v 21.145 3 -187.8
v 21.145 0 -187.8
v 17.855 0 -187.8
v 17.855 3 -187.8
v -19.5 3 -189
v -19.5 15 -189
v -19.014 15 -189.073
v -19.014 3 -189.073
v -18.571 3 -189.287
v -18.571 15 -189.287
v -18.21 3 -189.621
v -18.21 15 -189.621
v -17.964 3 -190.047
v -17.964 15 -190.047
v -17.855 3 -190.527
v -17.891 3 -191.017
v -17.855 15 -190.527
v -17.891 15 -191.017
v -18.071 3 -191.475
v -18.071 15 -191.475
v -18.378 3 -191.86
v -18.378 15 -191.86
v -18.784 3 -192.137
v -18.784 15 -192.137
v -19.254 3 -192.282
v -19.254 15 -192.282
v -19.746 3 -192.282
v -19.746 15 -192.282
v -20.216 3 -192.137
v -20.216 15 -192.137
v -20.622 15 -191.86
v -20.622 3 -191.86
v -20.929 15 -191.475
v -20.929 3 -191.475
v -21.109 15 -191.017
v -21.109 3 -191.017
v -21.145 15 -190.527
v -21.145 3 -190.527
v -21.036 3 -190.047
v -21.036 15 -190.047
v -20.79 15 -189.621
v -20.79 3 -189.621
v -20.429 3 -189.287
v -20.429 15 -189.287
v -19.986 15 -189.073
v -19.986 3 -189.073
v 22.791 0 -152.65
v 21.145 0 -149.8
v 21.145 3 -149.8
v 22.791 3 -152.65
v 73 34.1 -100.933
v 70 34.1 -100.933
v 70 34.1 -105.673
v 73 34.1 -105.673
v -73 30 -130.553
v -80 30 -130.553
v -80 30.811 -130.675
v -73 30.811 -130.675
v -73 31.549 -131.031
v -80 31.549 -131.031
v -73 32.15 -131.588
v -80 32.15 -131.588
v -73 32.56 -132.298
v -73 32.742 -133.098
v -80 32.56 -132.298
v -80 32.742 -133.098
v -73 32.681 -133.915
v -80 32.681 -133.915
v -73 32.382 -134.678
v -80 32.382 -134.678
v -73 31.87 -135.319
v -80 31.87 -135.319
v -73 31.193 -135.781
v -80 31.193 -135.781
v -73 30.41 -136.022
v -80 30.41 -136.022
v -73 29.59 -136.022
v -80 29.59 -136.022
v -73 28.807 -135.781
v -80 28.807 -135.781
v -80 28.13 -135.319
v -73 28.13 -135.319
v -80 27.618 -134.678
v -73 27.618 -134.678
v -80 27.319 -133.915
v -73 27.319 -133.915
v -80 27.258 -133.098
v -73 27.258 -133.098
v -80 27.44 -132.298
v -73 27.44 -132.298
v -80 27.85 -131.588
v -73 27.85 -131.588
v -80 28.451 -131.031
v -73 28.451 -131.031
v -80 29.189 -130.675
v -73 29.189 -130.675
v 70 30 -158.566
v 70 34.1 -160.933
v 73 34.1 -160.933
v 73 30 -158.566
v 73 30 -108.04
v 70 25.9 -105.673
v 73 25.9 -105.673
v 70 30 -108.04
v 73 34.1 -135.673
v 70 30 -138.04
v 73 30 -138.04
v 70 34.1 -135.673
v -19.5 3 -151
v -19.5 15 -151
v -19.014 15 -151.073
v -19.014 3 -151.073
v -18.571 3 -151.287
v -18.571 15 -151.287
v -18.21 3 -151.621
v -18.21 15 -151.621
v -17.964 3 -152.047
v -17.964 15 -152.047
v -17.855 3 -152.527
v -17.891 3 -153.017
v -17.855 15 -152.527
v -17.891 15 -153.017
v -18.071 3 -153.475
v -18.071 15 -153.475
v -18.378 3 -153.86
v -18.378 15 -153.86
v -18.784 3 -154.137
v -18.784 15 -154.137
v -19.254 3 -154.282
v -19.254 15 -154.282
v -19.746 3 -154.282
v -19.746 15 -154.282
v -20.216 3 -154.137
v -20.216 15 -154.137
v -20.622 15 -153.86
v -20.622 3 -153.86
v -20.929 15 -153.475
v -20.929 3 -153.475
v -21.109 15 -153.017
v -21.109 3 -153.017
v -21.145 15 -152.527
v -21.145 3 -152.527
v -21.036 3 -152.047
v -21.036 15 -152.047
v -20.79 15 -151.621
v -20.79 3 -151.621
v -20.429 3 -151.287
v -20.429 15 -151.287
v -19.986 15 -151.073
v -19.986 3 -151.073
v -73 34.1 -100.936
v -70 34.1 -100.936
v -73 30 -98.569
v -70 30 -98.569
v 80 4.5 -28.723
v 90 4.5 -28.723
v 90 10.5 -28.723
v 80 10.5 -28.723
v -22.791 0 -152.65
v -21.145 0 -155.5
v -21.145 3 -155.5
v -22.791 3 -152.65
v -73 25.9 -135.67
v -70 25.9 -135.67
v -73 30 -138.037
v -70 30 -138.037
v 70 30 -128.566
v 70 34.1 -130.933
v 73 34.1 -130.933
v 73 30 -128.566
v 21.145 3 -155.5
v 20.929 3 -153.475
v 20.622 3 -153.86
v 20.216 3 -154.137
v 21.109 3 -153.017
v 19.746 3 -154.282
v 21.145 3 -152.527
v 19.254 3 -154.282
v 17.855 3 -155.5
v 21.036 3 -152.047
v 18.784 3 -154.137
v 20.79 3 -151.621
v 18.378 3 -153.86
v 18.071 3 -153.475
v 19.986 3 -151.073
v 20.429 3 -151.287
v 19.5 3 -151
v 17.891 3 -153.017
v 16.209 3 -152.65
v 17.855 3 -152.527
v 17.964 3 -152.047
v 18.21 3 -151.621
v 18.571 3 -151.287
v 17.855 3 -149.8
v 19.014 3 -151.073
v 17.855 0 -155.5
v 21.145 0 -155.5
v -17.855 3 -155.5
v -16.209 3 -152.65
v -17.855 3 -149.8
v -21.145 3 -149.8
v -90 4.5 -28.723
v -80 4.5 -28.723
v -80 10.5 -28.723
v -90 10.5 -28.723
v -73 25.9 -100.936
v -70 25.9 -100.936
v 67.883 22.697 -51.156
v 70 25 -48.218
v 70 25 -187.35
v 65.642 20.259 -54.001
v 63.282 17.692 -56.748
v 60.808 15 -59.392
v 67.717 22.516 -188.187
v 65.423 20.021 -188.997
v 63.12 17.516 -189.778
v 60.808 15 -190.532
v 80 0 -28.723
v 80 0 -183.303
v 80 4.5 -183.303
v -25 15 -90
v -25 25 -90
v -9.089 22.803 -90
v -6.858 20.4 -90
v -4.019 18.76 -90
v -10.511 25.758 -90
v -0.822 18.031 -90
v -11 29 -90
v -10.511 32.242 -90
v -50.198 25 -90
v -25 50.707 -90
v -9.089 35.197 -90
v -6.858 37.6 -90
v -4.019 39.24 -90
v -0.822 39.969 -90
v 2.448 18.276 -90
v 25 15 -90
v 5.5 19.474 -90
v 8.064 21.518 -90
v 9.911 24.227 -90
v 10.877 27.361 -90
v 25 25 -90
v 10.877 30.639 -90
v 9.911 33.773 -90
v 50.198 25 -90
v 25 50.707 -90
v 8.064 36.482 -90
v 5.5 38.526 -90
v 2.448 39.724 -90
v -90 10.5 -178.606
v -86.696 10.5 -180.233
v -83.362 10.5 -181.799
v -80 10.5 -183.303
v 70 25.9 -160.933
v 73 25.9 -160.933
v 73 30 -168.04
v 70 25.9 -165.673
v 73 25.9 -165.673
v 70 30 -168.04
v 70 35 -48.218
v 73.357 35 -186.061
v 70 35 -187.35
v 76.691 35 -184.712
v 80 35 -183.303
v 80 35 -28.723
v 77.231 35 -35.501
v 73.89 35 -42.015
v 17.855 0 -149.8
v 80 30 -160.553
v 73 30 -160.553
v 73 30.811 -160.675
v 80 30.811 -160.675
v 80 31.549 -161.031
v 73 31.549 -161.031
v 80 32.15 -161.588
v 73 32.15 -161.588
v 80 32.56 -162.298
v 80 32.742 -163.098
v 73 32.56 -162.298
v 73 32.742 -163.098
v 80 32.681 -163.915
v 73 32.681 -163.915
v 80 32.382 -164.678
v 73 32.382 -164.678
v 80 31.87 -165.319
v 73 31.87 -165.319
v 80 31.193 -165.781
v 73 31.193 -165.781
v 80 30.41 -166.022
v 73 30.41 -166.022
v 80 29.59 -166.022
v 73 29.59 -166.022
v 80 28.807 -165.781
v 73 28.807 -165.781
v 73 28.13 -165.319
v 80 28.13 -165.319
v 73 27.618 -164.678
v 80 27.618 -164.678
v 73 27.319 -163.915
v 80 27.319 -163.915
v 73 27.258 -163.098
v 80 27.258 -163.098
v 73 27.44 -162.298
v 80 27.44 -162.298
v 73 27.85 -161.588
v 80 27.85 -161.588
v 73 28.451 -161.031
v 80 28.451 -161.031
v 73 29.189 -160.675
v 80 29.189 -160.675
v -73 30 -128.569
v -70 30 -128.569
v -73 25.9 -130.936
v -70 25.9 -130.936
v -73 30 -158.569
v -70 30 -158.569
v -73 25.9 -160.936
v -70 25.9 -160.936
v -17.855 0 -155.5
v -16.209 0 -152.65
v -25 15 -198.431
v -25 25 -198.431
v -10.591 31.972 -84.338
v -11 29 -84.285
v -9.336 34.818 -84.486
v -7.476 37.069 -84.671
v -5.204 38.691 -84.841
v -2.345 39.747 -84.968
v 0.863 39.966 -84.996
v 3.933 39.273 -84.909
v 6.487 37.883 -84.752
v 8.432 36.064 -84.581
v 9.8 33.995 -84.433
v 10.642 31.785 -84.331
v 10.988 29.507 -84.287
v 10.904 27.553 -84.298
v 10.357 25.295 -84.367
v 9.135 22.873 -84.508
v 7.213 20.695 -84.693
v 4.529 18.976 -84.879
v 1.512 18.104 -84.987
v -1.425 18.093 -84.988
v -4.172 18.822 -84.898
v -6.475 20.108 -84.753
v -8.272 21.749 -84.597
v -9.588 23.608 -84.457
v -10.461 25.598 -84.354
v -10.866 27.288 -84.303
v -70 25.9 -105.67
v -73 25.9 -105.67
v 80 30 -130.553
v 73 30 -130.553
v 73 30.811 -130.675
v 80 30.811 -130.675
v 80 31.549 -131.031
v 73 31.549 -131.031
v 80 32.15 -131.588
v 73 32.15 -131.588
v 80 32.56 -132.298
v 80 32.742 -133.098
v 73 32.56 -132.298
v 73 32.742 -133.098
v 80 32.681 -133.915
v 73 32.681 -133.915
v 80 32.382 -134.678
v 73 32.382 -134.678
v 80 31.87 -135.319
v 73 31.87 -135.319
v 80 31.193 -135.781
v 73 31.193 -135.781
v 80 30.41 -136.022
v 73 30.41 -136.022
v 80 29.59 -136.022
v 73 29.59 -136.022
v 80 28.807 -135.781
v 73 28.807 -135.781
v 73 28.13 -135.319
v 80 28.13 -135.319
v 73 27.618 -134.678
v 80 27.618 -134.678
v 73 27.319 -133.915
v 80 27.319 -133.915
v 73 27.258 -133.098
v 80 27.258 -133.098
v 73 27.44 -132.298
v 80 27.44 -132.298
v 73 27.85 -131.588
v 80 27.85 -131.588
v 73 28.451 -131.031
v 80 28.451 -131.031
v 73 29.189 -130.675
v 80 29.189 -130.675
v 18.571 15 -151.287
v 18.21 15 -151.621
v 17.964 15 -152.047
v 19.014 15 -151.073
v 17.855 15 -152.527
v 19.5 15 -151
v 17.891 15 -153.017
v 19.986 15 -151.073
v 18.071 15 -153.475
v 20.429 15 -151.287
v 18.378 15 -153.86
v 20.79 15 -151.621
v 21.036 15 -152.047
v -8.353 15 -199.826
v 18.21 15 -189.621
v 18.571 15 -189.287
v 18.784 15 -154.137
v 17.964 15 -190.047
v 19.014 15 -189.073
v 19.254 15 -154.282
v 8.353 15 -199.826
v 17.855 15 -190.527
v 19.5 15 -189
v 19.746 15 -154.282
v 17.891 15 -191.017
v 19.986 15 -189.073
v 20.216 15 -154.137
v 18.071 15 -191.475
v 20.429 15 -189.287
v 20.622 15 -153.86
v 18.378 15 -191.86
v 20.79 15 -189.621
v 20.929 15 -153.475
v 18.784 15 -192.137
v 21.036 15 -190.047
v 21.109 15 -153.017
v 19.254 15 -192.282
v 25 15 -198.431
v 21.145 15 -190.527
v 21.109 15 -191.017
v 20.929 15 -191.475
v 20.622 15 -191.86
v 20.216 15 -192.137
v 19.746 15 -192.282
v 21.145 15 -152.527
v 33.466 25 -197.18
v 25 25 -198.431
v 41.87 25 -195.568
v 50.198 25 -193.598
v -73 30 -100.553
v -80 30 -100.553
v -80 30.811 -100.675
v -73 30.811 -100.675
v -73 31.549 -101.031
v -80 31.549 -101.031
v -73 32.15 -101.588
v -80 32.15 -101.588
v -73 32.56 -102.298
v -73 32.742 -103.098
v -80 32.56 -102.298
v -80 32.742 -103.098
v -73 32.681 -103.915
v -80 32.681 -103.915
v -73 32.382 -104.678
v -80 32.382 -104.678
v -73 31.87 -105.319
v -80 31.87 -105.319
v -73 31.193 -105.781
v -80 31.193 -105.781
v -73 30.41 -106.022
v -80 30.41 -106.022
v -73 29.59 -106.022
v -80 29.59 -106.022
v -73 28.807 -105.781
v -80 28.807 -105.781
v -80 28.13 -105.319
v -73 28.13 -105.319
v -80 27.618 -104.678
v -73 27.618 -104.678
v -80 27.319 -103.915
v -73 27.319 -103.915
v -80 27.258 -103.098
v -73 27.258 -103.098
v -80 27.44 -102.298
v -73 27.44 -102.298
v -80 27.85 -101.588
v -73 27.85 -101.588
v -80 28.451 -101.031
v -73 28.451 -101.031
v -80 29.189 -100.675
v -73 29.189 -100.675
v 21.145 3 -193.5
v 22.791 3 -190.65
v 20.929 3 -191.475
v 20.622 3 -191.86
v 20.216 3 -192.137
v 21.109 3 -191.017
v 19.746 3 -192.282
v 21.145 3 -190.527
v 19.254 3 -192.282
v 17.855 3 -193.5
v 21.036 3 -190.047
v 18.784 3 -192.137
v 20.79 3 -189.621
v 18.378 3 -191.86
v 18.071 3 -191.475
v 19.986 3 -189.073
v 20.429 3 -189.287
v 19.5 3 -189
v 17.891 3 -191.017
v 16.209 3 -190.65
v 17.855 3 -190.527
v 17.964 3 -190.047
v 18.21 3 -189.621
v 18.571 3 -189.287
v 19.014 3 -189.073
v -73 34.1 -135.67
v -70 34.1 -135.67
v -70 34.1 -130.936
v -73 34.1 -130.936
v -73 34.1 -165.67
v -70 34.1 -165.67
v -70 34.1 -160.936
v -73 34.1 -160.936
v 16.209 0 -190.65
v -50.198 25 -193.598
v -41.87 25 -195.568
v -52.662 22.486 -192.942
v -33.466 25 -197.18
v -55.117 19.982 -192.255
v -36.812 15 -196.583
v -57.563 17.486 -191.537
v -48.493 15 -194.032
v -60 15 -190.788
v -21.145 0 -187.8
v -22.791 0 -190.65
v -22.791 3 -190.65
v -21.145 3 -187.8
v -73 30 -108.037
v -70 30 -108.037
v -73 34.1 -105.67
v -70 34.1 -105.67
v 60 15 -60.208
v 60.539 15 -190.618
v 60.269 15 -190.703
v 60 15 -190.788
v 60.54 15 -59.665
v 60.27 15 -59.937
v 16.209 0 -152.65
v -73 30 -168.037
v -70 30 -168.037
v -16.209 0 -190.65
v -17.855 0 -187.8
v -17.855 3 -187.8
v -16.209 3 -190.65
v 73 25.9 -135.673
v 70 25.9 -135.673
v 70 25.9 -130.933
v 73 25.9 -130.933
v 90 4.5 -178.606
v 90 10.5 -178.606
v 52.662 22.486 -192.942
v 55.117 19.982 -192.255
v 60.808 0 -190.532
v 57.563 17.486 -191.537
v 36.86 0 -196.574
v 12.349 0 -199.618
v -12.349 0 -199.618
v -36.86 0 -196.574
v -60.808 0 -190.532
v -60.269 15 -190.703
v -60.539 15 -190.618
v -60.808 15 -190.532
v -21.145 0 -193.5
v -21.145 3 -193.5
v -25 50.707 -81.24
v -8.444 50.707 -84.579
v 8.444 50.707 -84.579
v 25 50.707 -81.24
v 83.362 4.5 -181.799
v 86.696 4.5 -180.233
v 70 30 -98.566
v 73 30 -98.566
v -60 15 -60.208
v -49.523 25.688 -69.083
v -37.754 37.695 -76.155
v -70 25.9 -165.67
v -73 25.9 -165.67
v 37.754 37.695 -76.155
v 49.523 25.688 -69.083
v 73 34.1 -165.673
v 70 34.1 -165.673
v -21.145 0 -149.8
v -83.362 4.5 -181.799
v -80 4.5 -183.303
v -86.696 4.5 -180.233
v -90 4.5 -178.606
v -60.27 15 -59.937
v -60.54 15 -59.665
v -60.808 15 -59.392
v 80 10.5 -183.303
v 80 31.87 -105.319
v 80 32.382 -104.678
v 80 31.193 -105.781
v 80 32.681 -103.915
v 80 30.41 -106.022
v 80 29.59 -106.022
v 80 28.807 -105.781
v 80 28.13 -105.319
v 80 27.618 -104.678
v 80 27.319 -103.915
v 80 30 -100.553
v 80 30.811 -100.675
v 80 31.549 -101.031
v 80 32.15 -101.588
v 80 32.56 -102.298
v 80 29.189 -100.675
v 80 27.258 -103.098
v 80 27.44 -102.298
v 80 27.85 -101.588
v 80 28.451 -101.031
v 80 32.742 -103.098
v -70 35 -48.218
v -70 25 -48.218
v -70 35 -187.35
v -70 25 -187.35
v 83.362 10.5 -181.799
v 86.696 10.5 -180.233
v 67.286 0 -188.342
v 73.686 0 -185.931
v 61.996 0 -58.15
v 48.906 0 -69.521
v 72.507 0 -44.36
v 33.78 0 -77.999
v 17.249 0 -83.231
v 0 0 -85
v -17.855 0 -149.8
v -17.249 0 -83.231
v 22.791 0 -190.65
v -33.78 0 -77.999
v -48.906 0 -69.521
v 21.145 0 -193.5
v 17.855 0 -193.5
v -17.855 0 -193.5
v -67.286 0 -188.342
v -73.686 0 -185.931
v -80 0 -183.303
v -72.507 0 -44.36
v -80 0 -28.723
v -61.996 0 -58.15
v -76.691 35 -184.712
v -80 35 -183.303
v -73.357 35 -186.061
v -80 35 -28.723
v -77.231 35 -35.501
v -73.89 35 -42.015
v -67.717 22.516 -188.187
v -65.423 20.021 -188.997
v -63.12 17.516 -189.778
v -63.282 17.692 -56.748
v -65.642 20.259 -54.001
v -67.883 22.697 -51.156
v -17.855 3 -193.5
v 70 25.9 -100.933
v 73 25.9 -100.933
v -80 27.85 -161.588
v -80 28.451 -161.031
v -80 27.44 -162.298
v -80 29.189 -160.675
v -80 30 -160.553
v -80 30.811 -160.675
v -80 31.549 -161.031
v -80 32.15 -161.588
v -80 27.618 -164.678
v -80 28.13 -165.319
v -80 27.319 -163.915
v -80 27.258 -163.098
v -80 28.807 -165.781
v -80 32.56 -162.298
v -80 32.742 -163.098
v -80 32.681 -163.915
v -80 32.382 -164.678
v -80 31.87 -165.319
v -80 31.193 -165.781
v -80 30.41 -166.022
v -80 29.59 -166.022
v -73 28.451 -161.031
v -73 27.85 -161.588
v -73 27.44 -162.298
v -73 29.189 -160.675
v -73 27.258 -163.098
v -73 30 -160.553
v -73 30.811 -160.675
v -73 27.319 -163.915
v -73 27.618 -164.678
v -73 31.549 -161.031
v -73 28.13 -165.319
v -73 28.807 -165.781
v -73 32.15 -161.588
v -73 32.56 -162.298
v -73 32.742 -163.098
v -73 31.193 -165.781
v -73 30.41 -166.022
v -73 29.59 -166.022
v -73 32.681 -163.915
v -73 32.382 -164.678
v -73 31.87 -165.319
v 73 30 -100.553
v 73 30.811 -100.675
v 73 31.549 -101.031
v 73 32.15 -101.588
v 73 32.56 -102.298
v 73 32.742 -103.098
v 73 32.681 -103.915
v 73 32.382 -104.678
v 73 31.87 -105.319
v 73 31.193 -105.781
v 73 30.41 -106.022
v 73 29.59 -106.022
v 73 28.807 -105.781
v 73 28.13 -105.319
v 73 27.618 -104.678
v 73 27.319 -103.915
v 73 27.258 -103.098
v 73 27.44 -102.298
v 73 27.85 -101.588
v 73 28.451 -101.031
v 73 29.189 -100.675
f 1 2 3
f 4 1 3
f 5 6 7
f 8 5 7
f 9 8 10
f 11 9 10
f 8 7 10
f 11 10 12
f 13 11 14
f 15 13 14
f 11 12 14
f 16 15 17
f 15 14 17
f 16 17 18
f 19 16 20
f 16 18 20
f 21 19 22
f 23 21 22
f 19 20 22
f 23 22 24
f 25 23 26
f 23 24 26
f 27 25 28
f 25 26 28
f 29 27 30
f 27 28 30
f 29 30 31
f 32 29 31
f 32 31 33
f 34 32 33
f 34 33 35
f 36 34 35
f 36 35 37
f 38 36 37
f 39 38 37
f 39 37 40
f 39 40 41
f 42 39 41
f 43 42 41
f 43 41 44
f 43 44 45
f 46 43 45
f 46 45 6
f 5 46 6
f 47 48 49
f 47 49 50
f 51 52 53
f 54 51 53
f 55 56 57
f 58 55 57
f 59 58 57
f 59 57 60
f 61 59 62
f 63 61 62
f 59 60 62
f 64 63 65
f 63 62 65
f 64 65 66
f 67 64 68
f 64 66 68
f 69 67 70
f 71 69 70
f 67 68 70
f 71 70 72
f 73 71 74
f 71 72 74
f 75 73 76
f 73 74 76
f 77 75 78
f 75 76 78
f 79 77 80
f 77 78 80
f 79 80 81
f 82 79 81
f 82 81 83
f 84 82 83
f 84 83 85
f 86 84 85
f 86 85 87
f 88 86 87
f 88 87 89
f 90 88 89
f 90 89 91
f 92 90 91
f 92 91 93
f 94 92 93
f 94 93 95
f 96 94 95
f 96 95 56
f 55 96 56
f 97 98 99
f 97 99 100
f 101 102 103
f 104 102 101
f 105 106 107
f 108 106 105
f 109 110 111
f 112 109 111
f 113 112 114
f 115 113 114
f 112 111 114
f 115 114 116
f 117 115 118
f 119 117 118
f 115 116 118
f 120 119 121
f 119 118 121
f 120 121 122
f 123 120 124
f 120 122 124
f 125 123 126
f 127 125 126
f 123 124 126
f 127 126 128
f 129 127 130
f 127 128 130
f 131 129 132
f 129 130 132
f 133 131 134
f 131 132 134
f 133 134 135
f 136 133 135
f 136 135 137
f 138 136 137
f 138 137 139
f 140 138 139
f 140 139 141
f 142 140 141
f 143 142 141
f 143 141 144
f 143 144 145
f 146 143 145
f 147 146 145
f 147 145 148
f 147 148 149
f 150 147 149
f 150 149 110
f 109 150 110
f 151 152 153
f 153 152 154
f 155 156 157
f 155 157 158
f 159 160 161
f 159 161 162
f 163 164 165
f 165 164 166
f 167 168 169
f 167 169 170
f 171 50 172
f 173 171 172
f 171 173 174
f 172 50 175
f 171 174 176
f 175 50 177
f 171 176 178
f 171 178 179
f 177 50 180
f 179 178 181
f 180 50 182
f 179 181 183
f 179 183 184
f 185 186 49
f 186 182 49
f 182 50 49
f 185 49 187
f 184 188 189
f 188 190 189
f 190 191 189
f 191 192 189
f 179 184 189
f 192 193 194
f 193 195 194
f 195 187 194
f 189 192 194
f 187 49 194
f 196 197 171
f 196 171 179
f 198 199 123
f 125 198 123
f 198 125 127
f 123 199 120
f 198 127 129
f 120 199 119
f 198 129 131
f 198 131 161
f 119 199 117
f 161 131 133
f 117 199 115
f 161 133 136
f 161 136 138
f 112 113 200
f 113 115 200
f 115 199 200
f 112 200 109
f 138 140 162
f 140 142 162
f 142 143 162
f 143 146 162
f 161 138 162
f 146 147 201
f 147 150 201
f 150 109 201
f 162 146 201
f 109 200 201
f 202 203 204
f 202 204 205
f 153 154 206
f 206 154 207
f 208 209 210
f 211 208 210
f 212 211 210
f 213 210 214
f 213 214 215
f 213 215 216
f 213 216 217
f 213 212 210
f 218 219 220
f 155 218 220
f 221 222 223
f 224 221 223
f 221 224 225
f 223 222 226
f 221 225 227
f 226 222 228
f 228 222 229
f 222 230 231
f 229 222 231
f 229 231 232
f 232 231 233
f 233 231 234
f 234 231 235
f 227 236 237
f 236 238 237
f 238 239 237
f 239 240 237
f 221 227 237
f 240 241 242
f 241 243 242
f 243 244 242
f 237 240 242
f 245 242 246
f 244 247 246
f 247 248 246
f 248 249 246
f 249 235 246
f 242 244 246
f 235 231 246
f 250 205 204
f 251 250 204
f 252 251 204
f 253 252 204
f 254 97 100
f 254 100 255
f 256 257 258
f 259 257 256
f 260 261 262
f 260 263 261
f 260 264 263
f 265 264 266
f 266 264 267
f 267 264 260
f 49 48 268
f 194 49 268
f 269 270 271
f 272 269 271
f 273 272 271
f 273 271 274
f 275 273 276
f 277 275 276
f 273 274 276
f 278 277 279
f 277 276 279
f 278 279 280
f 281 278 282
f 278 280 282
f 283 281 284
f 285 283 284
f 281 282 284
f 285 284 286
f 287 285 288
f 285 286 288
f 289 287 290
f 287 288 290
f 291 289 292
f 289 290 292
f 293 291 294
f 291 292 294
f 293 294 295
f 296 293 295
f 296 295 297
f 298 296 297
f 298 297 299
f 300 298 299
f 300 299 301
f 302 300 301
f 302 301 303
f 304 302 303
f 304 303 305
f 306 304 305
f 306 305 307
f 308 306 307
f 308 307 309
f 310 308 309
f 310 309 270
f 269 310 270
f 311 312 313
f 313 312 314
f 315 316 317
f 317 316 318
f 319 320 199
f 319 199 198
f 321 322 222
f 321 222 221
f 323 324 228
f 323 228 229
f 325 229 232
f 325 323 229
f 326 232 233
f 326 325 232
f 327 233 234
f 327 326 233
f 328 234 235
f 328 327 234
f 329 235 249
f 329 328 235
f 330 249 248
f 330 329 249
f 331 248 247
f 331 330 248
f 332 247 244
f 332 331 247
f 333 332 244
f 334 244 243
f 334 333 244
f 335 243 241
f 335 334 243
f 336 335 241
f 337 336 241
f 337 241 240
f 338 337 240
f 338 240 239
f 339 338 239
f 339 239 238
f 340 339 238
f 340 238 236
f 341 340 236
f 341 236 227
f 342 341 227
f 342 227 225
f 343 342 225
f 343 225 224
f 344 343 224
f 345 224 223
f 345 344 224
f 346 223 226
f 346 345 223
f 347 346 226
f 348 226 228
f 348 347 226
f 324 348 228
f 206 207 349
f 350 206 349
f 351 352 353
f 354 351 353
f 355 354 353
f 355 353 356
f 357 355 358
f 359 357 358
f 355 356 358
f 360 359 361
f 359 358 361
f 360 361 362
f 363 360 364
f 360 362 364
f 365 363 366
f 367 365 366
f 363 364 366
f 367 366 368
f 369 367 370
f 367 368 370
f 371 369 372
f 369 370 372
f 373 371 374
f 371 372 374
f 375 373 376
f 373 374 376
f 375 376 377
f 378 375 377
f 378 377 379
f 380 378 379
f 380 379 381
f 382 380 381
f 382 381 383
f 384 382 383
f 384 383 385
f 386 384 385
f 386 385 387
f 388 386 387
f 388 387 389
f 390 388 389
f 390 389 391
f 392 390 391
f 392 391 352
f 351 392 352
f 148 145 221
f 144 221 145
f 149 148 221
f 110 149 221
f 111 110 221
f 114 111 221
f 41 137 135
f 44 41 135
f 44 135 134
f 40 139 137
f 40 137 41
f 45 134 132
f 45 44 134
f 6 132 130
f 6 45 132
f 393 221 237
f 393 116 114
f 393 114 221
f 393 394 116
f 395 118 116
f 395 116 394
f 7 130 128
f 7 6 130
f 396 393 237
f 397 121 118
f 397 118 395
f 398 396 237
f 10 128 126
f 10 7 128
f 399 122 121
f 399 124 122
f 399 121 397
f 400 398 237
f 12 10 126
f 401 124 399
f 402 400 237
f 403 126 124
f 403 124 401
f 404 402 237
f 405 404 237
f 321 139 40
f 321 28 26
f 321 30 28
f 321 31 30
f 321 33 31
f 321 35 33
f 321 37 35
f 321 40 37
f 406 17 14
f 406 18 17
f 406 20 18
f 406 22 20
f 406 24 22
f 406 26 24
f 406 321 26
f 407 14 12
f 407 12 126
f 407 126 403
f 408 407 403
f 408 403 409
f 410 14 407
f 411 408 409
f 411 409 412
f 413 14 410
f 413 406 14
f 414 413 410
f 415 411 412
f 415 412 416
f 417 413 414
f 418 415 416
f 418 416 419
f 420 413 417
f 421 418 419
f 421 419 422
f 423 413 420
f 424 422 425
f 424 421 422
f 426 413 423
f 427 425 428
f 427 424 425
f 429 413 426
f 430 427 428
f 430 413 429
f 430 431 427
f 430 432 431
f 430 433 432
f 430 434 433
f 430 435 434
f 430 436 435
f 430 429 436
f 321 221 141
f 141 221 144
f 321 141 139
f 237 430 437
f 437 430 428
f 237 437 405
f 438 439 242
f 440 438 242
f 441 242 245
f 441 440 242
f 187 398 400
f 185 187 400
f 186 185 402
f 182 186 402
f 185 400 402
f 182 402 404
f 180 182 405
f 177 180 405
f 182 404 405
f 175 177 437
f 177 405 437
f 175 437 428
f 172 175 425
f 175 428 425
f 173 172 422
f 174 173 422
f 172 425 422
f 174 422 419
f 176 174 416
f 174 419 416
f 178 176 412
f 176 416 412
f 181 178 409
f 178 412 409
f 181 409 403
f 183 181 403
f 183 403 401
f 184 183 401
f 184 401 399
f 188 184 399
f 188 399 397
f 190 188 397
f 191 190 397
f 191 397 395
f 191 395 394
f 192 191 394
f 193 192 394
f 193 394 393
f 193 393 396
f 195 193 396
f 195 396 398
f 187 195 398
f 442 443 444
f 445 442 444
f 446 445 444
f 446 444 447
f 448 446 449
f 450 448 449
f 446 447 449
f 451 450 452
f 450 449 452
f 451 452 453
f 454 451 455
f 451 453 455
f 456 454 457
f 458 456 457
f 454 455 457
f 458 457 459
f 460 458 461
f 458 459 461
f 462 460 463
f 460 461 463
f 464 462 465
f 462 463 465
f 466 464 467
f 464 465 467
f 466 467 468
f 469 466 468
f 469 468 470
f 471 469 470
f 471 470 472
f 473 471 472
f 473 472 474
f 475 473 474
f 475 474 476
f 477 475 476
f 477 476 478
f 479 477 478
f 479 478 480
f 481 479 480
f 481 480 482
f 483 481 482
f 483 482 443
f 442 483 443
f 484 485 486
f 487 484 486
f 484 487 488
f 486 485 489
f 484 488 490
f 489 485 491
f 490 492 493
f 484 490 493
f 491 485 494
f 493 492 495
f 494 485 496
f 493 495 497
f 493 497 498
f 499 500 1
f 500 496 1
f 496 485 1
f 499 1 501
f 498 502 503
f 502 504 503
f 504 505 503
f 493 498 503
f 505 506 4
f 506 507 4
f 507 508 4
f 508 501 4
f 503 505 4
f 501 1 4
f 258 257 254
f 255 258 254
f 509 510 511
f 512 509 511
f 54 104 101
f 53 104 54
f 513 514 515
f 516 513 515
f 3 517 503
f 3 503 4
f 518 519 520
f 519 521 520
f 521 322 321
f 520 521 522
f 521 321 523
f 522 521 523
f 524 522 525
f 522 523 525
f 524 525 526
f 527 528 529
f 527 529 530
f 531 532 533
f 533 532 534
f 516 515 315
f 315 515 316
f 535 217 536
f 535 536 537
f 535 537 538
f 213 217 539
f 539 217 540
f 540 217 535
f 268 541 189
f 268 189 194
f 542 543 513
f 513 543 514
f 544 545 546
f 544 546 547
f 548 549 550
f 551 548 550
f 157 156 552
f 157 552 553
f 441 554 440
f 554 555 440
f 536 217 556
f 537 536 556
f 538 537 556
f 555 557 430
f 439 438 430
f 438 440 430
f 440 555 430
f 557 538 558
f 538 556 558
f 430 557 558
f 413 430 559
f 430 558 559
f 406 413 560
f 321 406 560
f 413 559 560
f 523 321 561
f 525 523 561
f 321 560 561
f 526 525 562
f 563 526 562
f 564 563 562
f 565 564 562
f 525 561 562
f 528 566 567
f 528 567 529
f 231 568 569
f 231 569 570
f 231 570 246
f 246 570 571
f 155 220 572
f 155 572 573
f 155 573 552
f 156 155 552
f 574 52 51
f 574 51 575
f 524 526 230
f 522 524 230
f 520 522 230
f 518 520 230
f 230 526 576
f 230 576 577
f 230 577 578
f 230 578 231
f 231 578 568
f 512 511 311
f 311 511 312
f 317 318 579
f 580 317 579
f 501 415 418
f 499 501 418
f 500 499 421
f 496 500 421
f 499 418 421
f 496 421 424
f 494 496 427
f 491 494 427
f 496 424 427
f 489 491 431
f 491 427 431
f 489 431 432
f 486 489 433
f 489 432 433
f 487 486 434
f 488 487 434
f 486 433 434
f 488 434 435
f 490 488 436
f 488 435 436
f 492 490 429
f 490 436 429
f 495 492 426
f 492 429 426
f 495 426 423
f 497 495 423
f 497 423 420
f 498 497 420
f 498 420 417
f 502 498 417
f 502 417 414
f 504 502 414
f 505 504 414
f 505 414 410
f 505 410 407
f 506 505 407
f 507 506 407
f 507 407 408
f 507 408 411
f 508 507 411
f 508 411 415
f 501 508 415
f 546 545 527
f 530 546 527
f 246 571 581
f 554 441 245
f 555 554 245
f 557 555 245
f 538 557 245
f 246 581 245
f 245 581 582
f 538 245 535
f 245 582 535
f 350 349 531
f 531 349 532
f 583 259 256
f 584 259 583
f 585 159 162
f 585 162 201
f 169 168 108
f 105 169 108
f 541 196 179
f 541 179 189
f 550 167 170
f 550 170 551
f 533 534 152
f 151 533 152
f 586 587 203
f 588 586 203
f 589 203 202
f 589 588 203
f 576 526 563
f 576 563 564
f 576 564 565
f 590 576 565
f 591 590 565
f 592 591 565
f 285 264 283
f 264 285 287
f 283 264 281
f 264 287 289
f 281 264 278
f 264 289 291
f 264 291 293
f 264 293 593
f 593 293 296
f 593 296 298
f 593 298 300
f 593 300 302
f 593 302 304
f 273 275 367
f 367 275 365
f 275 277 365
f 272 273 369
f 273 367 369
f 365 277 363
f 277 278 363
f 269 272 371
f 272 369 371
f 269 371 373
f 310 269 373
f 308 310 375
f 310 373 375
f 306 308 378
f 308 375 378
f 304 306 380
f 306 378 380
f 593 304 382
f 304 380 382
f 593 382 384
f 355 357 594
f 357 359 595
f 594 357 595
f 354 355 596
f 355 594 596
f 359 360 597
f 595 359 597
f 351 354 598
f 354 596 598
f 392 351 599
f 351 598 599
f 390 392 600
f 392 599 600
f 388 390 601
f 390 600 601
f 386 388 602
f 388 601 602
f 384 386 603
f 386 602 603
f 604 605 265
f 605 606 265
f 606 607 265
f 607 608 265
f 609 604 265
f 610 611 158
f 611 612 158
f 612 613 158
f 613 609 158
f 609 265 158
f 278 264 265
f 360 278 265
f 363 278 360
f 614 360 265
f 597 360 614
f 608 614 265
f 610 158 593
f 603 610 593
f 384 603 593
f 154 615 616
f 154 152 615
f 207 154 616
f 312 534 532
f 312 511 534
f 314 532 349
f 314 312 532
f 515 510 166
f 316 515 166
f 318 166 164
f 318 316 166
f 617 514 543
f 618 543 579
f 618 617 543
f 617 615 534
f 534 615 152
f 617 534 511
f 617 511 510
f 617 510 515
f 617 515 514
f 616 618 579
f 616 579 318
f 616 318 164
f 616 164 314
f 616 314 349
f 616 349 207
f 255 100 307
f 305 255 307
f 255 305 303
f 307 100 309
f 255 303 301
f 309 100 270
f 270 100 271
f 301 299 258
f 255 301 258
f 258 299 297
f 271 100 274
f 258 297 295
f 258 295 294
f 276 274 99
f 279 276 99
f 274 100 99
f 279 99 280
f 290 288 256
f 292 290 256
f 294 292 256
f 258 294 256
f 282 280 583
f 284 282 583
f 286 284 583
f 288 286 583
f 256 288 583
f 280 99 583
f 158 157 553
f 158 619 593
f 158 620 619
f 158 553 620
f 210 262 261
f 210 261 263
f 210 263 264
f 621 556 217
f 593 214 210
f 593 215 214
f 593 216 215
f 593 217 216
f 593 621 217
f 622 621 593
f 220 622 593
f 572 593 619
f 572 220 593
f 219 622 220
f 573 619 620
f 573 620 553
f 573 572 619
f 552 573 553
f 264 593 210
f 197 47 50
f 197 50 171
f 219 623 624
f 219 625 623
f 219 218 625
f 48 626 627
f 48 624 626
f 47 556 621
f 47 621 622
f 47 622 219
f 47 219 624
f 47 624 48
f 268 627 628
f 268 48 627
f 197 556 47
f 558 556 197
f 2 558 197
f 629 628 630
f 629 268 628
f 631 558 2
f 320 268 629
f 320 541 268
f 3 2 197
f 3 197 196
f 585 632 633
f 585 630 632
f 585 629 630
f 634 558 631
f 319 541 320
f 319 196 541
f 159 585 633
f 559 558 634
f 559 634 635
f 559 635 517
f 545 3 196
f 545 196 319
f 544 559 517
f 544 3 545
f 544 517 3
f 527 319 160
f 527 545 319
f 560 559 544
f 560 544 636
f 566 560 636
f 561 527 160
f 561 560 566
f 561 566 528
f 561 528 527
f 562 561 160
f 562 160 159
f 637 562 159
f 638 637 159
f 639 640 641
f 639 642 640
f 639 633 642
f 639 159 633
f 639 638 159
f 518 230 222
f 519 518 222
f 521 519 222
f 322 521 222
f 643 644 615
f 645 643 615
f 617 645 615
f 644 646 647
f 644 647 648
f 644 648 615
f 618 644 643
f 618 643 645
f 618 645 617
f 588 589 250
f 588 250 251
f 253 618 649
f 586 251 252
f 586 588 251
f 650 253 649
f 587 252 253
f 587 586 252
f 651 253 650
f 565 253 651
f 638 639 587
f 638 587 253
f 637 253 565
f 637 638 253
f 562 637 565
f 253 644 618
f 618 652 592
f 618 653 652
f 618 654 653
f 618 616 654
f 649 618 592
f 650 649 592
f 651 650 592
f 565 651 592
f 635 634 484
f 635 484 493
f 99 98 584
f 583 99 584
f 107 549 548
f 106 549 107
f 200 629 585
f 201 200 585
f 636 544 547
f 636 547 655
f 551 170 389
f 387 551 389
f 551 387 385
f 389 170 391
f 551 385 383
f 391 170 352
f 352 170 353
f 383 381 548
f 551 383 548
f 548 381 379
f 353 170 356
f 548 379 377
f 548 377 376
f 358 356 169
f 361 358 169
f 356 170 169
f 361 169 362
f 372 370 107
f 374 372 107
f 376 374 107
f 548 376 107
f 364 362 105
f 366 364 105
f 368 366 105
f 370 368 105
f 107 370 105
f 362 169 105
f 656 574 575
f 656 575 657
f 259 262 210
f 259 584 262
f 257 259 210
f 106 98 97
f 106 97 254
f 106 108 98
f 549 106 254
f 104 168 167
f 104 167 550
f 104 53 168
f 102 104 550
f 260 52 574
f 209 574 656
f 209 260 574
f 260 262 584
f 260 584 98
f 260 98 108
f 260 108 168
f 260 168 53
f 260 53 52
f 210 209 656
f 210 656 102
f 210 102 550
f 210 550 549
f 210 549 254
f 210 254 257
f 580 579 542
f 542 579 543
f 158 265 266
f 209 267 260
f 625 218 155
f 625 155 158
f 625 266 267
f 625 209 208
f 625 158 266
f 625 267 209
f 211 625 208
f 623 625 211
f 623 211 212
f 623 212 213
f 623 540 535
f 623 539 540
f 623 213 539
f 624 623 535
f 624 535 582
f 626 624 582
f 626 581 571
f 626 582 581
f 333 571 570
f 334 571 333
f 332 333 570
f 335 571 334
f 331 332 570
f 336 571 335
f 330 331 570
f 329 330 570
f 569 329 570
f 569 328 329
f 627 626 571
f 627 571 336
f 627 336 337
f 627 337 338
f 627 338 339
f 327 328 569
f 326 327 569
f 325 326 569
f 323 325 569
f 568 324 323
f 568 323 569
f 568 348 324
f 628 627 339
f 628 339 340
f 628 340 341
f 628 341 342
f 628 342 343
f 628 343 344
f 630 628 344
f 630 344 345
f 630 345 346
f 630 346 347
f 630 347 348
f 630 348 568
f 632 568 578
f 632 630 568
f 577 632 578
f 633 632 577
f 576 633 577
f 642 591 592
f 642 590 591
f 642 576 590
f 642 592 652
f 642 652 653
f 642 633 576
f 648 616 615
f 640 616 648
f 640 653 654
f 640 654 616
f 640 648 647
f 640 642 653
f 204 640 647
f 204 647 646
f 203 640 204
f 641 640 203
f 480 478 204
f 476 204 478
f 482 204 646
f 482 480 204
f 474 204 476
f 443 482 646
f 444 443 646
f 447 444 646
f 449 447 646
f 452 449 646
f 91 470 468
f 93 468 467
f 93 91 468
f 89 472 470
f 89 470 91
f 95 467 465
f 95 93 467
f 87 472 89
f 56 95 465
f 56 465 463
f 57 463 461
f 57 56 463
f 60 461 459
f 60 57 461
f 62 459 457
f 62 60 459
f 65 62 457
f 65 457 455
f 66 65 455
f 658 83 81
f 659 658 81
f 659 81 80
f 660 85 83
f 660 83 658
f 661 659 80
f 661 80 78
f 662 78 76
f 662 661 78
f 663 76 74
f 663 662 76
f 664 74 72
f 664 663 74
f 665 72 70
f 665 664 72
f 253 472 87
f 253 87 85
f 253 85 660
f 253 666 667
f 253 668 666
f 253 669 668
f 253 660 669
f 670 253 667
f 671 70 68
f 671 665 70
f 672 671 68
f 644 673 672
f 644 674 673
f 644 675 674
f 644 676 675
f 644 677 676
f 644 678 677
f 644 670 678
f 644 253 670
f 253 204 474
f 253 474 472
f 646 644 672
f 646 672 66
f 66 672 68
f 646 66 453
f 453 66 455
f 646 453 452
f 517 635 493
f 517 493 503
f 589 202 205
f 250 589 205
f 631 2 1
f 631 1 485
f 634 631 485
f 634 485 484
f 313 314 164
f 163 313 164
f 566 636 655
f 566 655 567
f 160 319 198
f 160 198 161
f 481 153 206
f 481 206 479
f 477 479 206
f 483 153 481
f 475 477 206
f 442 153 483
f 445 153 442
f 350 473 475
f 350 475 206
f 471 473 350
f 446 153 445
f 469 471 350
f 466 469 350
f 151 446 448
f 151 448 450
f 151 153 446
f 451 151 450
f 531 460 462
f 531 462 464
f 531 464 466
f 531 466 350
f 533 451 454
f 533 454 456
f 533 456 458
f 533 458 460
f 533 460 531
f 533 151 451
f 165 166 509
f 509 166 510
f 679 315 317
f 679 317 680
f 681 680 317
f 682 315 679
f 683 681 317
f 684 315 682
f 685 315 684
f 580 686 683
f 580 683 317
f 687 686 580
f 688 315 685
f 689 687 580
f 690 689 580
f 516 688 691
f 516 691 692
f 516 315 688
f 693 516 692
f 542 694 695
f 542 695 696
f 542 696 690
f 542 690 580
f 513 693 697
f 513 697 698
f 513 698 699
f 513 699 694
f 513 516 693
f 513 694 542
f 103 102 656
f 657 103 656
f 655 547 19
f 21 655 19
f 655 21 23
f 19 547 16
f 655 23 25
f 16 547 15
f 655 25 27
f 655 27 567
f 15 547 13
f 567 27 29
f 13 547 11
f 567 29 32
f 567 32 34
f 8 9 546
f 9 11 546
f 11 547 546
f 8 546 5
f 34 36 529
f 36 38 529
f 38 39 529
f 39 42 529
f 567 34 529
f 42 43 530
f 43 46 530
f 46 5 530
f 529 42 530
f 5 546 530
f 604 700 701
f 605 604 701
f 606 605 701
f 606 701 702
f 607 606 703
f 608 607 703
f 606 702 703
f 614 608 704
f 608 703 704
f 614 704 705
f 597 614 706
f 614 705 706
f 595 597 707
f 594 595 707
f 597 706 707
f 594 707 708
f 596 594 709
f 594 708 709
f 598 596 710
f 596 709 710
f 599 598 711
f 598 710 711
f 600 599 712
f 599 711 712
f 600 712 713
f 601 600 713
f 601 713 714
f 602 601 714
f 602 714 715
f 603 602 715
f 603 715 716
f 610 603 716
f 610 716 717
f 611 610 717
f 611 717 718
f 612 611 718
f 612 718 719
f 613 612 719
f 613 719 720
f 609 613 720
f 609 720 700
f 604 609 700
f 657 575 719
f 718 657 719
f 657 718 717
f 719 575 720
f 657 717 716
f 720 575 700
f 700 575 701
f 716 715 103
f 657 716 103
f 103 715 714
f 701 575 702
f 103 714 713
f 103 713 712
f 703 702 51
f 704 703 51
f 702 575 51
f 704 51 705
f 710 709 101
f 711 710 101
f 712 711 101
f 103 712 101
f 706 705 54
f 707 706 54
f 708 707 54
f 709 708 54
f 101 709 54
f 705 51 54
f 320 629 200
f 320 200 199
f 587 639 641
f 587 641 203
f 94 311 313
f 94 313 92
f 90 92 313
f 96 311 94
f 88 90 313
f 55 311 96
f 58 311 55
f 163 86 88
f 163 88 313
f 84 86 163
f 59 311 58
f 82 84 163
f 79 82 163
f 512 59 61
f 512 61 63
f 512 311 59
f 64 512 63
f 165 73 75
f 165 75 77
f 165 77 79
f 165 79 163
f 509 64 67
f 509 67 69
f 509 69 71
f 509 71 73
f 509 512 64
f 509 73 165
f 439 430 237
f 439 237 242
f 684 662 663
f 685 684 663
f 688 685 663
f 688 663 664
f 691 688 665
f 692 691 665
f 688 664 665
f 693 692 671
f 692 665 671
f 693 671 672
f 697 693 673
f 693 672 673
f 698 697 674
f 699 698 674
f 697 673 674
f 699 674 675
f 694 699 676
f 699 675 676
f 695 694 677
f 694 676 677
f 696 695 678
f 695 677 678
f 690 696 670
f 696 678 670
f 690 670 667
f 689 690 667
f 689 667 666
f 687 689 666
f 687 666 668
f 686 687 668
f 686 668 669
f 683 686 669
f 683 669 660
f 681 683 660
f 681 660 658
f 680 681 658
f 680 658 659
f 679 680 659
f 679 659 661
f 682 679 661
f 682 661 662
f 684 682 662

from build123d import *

# Parameters (mm, degrees)
SKETCH1_R                = 200
BOSS_EXTRUDE1_DEPTH      = 15
BOSS_EXTRUDE2_DEPTH      = 200
CUT_EXTRUDE1_DEPTH       = 286.087705803
CUT_EXTRUDE1_DEPTH_BACK  = 286.087705803
SKETCH3_R                = 85
CUT_EXTRUDE2_DEPTH       = 451.079120005
CUT_EXTRUDE2_DEPTH_BACK  = 451.079120005
SKETCH4_R                = 11
CUT_EXTRUDE3_DEPTH       = 451.079120105
CUT_EXTRUDE3_DEPTH_BACK  = 110
CUT_EXTRUDE4_DEPTH       = 110
BOSS_EXTRUDE3_DEPTH      = 200
CUT_EXTRUDE5_DEPTH       = 286.087705815
CUT_EXTRUDE5_DEPTH_BACK  = 286.087705815
SKETCH7_OUTSIDE_W        = 515.59
SKETCH7_OUTSIDE_H        = 515.59
SKETCH7_OUTSIDE_R        = 200
SKETCH9_R                = 4
BOSS_EXTRUDE4_DEPTH      = 220
CUT_EXTRUDE6_DEPTH       = 190
SKETCH11_R               = 3
CUT_EXTRUDE7_DEPTH       = 486.974499745
CUT_EXTRUDE8_DEPTH       = 302.61434707
CUT_EXTRUDE8_DEPTH_BACK  = 302.61434707
BOSS_EXTRUDE5_DEPTH      = 150
CUT_EXTRUDE9_DEPTH       = 262.287608345
CUT_EXTRUDE9_DEPTH_BACK  = 262.287608345
CUT_EXTRUDE10_DEPTH      = 259.795285906
CUT_EXTRUDE10_DEPTH_BACK = 259.795285906
SKETCH18_R               = 85
CUT_EXTRUDE11_START      = -15
CUT_EXTRUDE11_DEPTH      = 35
SKETCH20_R               = 2.75
CUT_EXTRUDE12_DEPTH      = 268.341007469
CUT_EXTRUDE13_DEPTH      = 3
CUT_EXTRUDE14_DEPTH      = 3
LPATTERN1_COUNT          = 3
LPATTERN1_PITCH          = 30
SKETCH23_R               = 1.65
CUT_EXTRUDE15_DEPTH      = 20
LPATTERN2_COUNT          = 3
LPATTERN2_PITCH          = 30
CUT_EXTRUDE16_DEPTH      = 3


# Read off the part's stored shape, not the designer's step: Cut-Extrude11
with BuildPart() as part:
    # Sketch1 → Boss-Extrude1 (new body)
    with BuildSketch(Plane(origin=(0, 0, 0), x_dir=(1, 0, 0), z_dir=(0, 1, 0))):
        with Locations(Location((0, 0, 0), (0, 0, 270))):
            Circle(SKETCH1_R)
    extrude(amount=BOSS_EXTRUDE1_DEPTH)

    # Sketch2 → Boss-Extrude2 (add, symmetric)
    with BuildSketch(Plane.XY):
        Polygon((-25, 50.707142143), (25, 50.707142143), (60, 15), (-60, 15), align=None)
    extrude(amount=BOSS_EXTRUDE2_DEPTH, both=True)

    # Sketch3 → Cut-Extrude1 (cut, two sides: drawn at the far end of the back side and taken through both)
    with BuildSketch(Plane(origin=(0, 15, 0), x_dir=(1, 0, 0), z_dir=(0, 1, 0)).offset(-CUT_EXTRUDE1_DEPTH_BACK)):
        with Locations(Location((0, 0, 0), (0, 0, 270))):
            Circle(SKETCH3_R)
    extrude(amount=CUT_EXTRUDE1_DEPTH + CUT_EXTRUDE1_DEPTH_BACK, mode=Mode.SUBTRACT)

    # Sketch4 → Cut-Extrude2 (cut, two sides: drawn at the far end of the back side and taken through both)
    with BuildSketch(Plane(origin=(0, 0, -200), x_dir=(-1, 0, 0), z_dir=(0, 0, -1)).offset(-CUT_EXTRUDE2_DEPTH_BACK)):
        with Locations((0, 29)):
            Circle(SKETCH4_R)
    extrude(amount=CUT_EXTRUDE2_DEPTH + CUT_EXTRUDE2_DEPTH_BACK, mode=Mode.SUBTRACT)

    # Sketch5 → Cut-Extrude3 (cut, two sides: drawn at the far end of the back side and taken through both)
    with BuildSketch(Plane.XY.offset(200).offset(-CUT_EXTRUDE3_DEPTH_BACK)):
        Polygon((-25, 50.707142143), (25, 50.707142143), (50.198039412, 25), (25, 25), (25, 15), (-25, 15), (-25, 25), (-50.198039412, 25), align=None)
    extrude(amount=CUT_EXTRUDE3_DEPTH + CUT_EXTRUDE3_DEPTH_BACK, mode=Mode.SUBTRACT)

    # Sketch6 → Cut-Extrude4 (cut)
    with BuildSketch(Plane(origin=(0, 0, -200), x_dir=(-1, 0, 0), z_dir=(0, 0, -1))):
        Polygon((-25, 50.707142143), (25, 50.707142143), (50.198039412, 25), (25, 25), (25, 15), (-25, 15), (-25, 25), (-50.198039412, 25), align=None)
    extrude(amount=-CUT_EXTRUDE4_DEPTH, mode=Mode.SUBTRACT)

    # Sketch8 → Boss-Extrude3 (add, symmetric)
    with BuildSketch(Plane(origin=(0, 0, 0), x_dir=(0, 0, -1), z_dir=(1, 0, 0))):
        Polygon((0, 15), (-20, 15), (-10, 35.712315177), (10, 35.712315177), (20, 15), align=None)
    extrude(amount=BOSS_EXTRUDE3_DEPTH, both=True)

    # Sketch7 outside → Cut-Extrude5 (cut, two sides: drawn at the far end of the back side and taken through both)
    with BuildSketch(Plane(origin=(0, 15, 0), x_dir=(1, 0, 0), z_dir=(0, 1, 0)).offset(-CUT_EXTRUDE5_DEPTH_BACK)):
        Rectangle(SKETCH7_OUTSIDE_W, SKETCH7_OUTSIDE_H)
        with Locations(Location((0, 0, 0), (0, 0, 97.180755781))):
            Circle(SKETCH7_OUTSIDE_R, mode=Mode.SUBTRACT)
    extrude(amount=CUT_EXTRUDE5_DEPTH + CUT_EXTRUDE5_DEPTH_BACK, mode=Mode.SUBTRACT)

    # Sketch9 → Boss-Extrude4 (add, symmetric)
    with BuildSketch(Plane(origin=(0, 0, 0), x_dir=(0, 0, -1), z_dir=(1, 0, 0))):
        with Locations(Location((0, 29, 0), (0, 0, 180))):
            Circle(SKETCH9_R)
    extrude(amount=BOSS_EXTRUDE4_DEPTH, both=True)

    # Sketch10 → Cut-Extrude6 (cut, symmetric)
    with BuildSketch(Plane(origin=(0, 0, 0), x_dir=(0, 0, -1), z_dir=(1, 0, 0))):
        Polygon((-20, 15), (20, 15), (10, 35.712315177), (-10, 35.712315177), align=None)
    extrude(amount=CUT_EXTRUDE6_DEPTH, both=True, mode=Mode.SUBTRACT)

    # Sketch11 → Cut-Extrude7 (cut, through all)
    with BuildSketch(Plane.ZY.offset(220)):
        with Locations((0, 29)):
            Circle(SKETCH11_R)
    extrude(amount=-CUT_EXTRUDE7_DEPTH, mode=Mode.SUBTRACT)

    # Sketch14 → Cut-Extrude8 (cut, two sides: drawn at the far end of the back side and taken through both)
    with BuildSketch(Plane(origin=(0, 0, 0), x_dir=(1, 0, 0), z_dir=(0, 1, 0)).offset(-CUT_EXTRUDE8_DEPTH_BACK)):
        Polygon((-80, 28.722813233), (-80, 204.683452683), (-270.013244013, 28.722813233), (-103.583737584, -216.10995611), (187.046893047, -216.10995611), (266.535612536, 150.034958035), (80, 209.154693155), (80, 28.722813233), align=None)
    extrude(amount=CUT_EXTRUDE8_DEPTH + CUT_EXTRUDE8_DEPTH_BACK, mode=Mode.SUBTRACT)

    # Sketch16 → Boss-Extrude5 (add, symmetric)
    with BuildSketch(Plane(origin=(0, 0, -90), x_dir=(-1, 0, 0), z_dir=(0, 0, -1))):
        Polygon((-80, 15), (-80, 35), (-70, 35), (-70, 25), (-60.807611845, 15), (-60.807611845, 0), (-80, 0), (-80, 4.5), (-90, 4.5), (-90, 10.5), (-80, 10.5), align=None)
        Polygon((80, 15), (80, 35), (70, 35), (70, 25), (60.807611845, 15), (60.807611845, 0), (80, 0), (80, 4.5), (90, 4.5), (90, 10.5), (80, 10.5), align=None)
    extrude(amount=BOSS_EXTRUDE5_DEPTH, both=True)

    # Sketch17 → Cut-Extrude9 (cut, two sides: drawn at the far end of the back side and taken through both)
    with BuildSketch(Plane(origin=(0, 0, 0), x_dir=(1, 0, 0), z_dir=(0, 1, 0)).offset(-CUT_EXTRUDE9_DEPTH_BACK)):
        Polygon((-80, 28.722813233), (-99.608008808, 28.722813233), (-99.608008808, -74.271563426), (112.245925984, -74.271563426), (112.245925984, 0), (109.222119936, 28.722813233), (80, 28.722813233), align=None)
    extrude(amount=CUT_EXTRUDE9_DEPTH + CUT_EXTRUDE9_DEPTH_BACK, mode=Mode.SUBTRACT)

    # Sketch18 → Cut-Extrude10 (cut, two sides: drawn at the far end of the back side and taken through both)
    with BuildSketch(Plane(origin=(0, 15, 0), x_dir=(1, 0, 0), z_dir=(0, 1, 0)).offset(-CUT_EXTRUDE10_DEPTH_BACK)):
        Circle(SKETCH18_R)
    extrude(amount=CUT_EXTRUDE10_DEPTH + CUT_EXTRUDE10_DEPTH_BACK, mode=Mode.SUBTRACT)

    # Cut-Extrude11 outline → Cut-Extrude11 (cut)
    with BuildSketch(Plane(origin=(0, 15, 0), x_dir=(1, 0, 0), z_dir=(0, 1, 0)).offset(CUT_EXTRUDE11_START)):
        with BuildLine():
            Line((60.807611845, 240), (60.807611845, 190.531977216))
            ThreePointArc((60.807611845, 190.531977216), (75.639228606, 185.145097413), (90, 178.605710995))
            Line((90, 178.605710995), (90, 240))
            Line((90, 240), (60.807611845, 240))
        make_face()
        with BuildLine():
            Line((-60.807611845, 190.531977216), (-60.807611845, 240))
            Line((-60.807611845, 240), (-90, 240))
            Line((-90, 240), (-90, 178.605710995))
            ThreePointArc((-90, 178.605710995), (-75.639228606, 185.145097413), (-60.807611845, 190.531977216))
        make_face()
    extrude(amount=CUT_EXTRUDE11_DEPTH, mode=Mode.SUBTRACT)

    # Sketch20 → Cut-Extrude12 (cut, through all)
    with BuildSketch(Plane.ZY.offset(80)):
        with Locations((-163.303027798, 30)):
            Circle(SKETCH20_R)
        with Locations((-103.303027798, 30)):
            Circle(SKETCH20_R)
        with Locations((-133.303027798, 30)):
            Circle(SKETCH20_R)
    extrude(amount=-CUT_EXTRUDE12_DEPTH, mode=Mode.SUBTRACT)

    # Sketch21 → Cut-Extrude13 (cut)
    with BuildSketch(Plane(origin=(-70, 0, 0), x_dir=(0, 0, -1), z_dir=(1, 0, 0))):
        Polygon((100.935891695, 34.1), (98.568755591, 30), (100.935891695, 25.9), (105.670163902, 25.9), (108.037300006, 30), (105.670163902, 34.1), (103.303027798, 34.1), align=None)
    cut_extrude13 = extrude(amount=-CUT_EXTRUDE13_DEPTH, mode=Mode.SUBTRACT)

    # Sketch22 → Cut-Extrude14 (cut)
    with BuildSketch(Plane.ZY.offset(-70)):
        Polygon((-163.303027798, 34.1), (-160.933027798, 34.1), (-158.565891695, 30), (-160.933027798, 25.9), (-163.303027798, 25.9), (-165.673027798, 25.9), (-168.040163902, 30), (-165.673027798, 34.1), align=None)
    cut_extrude14 = extrude(amount=-CUT_EXTRUDE14_DEPTH, mode=Mode.SUBTRACT)

    # LPattern1: Cut-Extrude14 ×3
    with Locations(*[(0, 0, i * LPATTERN1_PITCH) for i in range(1, LPATTERN1_COUNT)]):
        add(cut_extrude14, mode=Mode.SUBTRACT)

    # Sketch23 → Cut-Extrude15 (cut)
    with BuildSketch(Plane(origin=(0, 15, 0), x_dir=(1, 0, 0), z_dir=(0, 1, 0))):
        with Locations(Location((19.5, 152.65, 0), (0, 0, 270))):
            Circle(SKETCH23_R)
        with Locations(Location((-19.5, 152.65, 0), (0, 0, 270))):
            Circle(SKETCH23_R)
        with Locations(Location((-19.5, 190.65, 0), (0, 0, 270))):
            Circle(SKETCH23_R)
        with Locations(Location((19.5, 190.65, 0), (0, 0, 270))):
            Circle(SKETCH23_R)
    extrude(amount=-CUT_EXTRUDE15_DEPTH, mode=Mode.SUBTRACT)

    # LPattern2: Cut-Extrude13 ×3
    with Locations(*[(0, 0, -i * LPATTERN2_PITCH) for i in range(1, LPATTERN2_COUNT)]):
        add(cut_extrude13, mode=Mode.SUBTRACT)

    # Sketch24 → Cut-Extrude16 (cut)
    with BuildSketch(Plane.XZ):
        Polygon((-19.5, -187.8), (-17.854551733, -187.8), (-16.209103466, -190.65), (-17.854551733, -193.5), (-21.145448267, -193.5), (-22.790896534, -190.65), (-21.145448267, -187.8), align=None)
        Polygon((-19.5, -149.8), (-17.854551733, -149.8), (-16.209103466, -152.65), (-17.854551733, -155.5), (-21.145448267, -155.5), (-22.790896534, -152.65), (-21.145448267, -149.8), align=None)
        Polygon((19.5, -149.8), (21.145448267, -149.8), (22.790896534, -152.65), (21.145448267, -155.5), (17.854551733, -155.5), (16.209103466, -152.65), (17.854551733, -149.8), align=None)
        Polygon((19.5, -187.8), (21.145448267, -187.8), (22.790896713, -190.649999897), (21.145448624, -193.5), (17.85455209, -193.5), (16.209103644, -190.650000103), (17.854551733, -187.8), align=None)
    extrude(amount=-CUT_EXTRUDE16_DEPTH, mode=Mode.SUBTRACT)


solid = part.part
